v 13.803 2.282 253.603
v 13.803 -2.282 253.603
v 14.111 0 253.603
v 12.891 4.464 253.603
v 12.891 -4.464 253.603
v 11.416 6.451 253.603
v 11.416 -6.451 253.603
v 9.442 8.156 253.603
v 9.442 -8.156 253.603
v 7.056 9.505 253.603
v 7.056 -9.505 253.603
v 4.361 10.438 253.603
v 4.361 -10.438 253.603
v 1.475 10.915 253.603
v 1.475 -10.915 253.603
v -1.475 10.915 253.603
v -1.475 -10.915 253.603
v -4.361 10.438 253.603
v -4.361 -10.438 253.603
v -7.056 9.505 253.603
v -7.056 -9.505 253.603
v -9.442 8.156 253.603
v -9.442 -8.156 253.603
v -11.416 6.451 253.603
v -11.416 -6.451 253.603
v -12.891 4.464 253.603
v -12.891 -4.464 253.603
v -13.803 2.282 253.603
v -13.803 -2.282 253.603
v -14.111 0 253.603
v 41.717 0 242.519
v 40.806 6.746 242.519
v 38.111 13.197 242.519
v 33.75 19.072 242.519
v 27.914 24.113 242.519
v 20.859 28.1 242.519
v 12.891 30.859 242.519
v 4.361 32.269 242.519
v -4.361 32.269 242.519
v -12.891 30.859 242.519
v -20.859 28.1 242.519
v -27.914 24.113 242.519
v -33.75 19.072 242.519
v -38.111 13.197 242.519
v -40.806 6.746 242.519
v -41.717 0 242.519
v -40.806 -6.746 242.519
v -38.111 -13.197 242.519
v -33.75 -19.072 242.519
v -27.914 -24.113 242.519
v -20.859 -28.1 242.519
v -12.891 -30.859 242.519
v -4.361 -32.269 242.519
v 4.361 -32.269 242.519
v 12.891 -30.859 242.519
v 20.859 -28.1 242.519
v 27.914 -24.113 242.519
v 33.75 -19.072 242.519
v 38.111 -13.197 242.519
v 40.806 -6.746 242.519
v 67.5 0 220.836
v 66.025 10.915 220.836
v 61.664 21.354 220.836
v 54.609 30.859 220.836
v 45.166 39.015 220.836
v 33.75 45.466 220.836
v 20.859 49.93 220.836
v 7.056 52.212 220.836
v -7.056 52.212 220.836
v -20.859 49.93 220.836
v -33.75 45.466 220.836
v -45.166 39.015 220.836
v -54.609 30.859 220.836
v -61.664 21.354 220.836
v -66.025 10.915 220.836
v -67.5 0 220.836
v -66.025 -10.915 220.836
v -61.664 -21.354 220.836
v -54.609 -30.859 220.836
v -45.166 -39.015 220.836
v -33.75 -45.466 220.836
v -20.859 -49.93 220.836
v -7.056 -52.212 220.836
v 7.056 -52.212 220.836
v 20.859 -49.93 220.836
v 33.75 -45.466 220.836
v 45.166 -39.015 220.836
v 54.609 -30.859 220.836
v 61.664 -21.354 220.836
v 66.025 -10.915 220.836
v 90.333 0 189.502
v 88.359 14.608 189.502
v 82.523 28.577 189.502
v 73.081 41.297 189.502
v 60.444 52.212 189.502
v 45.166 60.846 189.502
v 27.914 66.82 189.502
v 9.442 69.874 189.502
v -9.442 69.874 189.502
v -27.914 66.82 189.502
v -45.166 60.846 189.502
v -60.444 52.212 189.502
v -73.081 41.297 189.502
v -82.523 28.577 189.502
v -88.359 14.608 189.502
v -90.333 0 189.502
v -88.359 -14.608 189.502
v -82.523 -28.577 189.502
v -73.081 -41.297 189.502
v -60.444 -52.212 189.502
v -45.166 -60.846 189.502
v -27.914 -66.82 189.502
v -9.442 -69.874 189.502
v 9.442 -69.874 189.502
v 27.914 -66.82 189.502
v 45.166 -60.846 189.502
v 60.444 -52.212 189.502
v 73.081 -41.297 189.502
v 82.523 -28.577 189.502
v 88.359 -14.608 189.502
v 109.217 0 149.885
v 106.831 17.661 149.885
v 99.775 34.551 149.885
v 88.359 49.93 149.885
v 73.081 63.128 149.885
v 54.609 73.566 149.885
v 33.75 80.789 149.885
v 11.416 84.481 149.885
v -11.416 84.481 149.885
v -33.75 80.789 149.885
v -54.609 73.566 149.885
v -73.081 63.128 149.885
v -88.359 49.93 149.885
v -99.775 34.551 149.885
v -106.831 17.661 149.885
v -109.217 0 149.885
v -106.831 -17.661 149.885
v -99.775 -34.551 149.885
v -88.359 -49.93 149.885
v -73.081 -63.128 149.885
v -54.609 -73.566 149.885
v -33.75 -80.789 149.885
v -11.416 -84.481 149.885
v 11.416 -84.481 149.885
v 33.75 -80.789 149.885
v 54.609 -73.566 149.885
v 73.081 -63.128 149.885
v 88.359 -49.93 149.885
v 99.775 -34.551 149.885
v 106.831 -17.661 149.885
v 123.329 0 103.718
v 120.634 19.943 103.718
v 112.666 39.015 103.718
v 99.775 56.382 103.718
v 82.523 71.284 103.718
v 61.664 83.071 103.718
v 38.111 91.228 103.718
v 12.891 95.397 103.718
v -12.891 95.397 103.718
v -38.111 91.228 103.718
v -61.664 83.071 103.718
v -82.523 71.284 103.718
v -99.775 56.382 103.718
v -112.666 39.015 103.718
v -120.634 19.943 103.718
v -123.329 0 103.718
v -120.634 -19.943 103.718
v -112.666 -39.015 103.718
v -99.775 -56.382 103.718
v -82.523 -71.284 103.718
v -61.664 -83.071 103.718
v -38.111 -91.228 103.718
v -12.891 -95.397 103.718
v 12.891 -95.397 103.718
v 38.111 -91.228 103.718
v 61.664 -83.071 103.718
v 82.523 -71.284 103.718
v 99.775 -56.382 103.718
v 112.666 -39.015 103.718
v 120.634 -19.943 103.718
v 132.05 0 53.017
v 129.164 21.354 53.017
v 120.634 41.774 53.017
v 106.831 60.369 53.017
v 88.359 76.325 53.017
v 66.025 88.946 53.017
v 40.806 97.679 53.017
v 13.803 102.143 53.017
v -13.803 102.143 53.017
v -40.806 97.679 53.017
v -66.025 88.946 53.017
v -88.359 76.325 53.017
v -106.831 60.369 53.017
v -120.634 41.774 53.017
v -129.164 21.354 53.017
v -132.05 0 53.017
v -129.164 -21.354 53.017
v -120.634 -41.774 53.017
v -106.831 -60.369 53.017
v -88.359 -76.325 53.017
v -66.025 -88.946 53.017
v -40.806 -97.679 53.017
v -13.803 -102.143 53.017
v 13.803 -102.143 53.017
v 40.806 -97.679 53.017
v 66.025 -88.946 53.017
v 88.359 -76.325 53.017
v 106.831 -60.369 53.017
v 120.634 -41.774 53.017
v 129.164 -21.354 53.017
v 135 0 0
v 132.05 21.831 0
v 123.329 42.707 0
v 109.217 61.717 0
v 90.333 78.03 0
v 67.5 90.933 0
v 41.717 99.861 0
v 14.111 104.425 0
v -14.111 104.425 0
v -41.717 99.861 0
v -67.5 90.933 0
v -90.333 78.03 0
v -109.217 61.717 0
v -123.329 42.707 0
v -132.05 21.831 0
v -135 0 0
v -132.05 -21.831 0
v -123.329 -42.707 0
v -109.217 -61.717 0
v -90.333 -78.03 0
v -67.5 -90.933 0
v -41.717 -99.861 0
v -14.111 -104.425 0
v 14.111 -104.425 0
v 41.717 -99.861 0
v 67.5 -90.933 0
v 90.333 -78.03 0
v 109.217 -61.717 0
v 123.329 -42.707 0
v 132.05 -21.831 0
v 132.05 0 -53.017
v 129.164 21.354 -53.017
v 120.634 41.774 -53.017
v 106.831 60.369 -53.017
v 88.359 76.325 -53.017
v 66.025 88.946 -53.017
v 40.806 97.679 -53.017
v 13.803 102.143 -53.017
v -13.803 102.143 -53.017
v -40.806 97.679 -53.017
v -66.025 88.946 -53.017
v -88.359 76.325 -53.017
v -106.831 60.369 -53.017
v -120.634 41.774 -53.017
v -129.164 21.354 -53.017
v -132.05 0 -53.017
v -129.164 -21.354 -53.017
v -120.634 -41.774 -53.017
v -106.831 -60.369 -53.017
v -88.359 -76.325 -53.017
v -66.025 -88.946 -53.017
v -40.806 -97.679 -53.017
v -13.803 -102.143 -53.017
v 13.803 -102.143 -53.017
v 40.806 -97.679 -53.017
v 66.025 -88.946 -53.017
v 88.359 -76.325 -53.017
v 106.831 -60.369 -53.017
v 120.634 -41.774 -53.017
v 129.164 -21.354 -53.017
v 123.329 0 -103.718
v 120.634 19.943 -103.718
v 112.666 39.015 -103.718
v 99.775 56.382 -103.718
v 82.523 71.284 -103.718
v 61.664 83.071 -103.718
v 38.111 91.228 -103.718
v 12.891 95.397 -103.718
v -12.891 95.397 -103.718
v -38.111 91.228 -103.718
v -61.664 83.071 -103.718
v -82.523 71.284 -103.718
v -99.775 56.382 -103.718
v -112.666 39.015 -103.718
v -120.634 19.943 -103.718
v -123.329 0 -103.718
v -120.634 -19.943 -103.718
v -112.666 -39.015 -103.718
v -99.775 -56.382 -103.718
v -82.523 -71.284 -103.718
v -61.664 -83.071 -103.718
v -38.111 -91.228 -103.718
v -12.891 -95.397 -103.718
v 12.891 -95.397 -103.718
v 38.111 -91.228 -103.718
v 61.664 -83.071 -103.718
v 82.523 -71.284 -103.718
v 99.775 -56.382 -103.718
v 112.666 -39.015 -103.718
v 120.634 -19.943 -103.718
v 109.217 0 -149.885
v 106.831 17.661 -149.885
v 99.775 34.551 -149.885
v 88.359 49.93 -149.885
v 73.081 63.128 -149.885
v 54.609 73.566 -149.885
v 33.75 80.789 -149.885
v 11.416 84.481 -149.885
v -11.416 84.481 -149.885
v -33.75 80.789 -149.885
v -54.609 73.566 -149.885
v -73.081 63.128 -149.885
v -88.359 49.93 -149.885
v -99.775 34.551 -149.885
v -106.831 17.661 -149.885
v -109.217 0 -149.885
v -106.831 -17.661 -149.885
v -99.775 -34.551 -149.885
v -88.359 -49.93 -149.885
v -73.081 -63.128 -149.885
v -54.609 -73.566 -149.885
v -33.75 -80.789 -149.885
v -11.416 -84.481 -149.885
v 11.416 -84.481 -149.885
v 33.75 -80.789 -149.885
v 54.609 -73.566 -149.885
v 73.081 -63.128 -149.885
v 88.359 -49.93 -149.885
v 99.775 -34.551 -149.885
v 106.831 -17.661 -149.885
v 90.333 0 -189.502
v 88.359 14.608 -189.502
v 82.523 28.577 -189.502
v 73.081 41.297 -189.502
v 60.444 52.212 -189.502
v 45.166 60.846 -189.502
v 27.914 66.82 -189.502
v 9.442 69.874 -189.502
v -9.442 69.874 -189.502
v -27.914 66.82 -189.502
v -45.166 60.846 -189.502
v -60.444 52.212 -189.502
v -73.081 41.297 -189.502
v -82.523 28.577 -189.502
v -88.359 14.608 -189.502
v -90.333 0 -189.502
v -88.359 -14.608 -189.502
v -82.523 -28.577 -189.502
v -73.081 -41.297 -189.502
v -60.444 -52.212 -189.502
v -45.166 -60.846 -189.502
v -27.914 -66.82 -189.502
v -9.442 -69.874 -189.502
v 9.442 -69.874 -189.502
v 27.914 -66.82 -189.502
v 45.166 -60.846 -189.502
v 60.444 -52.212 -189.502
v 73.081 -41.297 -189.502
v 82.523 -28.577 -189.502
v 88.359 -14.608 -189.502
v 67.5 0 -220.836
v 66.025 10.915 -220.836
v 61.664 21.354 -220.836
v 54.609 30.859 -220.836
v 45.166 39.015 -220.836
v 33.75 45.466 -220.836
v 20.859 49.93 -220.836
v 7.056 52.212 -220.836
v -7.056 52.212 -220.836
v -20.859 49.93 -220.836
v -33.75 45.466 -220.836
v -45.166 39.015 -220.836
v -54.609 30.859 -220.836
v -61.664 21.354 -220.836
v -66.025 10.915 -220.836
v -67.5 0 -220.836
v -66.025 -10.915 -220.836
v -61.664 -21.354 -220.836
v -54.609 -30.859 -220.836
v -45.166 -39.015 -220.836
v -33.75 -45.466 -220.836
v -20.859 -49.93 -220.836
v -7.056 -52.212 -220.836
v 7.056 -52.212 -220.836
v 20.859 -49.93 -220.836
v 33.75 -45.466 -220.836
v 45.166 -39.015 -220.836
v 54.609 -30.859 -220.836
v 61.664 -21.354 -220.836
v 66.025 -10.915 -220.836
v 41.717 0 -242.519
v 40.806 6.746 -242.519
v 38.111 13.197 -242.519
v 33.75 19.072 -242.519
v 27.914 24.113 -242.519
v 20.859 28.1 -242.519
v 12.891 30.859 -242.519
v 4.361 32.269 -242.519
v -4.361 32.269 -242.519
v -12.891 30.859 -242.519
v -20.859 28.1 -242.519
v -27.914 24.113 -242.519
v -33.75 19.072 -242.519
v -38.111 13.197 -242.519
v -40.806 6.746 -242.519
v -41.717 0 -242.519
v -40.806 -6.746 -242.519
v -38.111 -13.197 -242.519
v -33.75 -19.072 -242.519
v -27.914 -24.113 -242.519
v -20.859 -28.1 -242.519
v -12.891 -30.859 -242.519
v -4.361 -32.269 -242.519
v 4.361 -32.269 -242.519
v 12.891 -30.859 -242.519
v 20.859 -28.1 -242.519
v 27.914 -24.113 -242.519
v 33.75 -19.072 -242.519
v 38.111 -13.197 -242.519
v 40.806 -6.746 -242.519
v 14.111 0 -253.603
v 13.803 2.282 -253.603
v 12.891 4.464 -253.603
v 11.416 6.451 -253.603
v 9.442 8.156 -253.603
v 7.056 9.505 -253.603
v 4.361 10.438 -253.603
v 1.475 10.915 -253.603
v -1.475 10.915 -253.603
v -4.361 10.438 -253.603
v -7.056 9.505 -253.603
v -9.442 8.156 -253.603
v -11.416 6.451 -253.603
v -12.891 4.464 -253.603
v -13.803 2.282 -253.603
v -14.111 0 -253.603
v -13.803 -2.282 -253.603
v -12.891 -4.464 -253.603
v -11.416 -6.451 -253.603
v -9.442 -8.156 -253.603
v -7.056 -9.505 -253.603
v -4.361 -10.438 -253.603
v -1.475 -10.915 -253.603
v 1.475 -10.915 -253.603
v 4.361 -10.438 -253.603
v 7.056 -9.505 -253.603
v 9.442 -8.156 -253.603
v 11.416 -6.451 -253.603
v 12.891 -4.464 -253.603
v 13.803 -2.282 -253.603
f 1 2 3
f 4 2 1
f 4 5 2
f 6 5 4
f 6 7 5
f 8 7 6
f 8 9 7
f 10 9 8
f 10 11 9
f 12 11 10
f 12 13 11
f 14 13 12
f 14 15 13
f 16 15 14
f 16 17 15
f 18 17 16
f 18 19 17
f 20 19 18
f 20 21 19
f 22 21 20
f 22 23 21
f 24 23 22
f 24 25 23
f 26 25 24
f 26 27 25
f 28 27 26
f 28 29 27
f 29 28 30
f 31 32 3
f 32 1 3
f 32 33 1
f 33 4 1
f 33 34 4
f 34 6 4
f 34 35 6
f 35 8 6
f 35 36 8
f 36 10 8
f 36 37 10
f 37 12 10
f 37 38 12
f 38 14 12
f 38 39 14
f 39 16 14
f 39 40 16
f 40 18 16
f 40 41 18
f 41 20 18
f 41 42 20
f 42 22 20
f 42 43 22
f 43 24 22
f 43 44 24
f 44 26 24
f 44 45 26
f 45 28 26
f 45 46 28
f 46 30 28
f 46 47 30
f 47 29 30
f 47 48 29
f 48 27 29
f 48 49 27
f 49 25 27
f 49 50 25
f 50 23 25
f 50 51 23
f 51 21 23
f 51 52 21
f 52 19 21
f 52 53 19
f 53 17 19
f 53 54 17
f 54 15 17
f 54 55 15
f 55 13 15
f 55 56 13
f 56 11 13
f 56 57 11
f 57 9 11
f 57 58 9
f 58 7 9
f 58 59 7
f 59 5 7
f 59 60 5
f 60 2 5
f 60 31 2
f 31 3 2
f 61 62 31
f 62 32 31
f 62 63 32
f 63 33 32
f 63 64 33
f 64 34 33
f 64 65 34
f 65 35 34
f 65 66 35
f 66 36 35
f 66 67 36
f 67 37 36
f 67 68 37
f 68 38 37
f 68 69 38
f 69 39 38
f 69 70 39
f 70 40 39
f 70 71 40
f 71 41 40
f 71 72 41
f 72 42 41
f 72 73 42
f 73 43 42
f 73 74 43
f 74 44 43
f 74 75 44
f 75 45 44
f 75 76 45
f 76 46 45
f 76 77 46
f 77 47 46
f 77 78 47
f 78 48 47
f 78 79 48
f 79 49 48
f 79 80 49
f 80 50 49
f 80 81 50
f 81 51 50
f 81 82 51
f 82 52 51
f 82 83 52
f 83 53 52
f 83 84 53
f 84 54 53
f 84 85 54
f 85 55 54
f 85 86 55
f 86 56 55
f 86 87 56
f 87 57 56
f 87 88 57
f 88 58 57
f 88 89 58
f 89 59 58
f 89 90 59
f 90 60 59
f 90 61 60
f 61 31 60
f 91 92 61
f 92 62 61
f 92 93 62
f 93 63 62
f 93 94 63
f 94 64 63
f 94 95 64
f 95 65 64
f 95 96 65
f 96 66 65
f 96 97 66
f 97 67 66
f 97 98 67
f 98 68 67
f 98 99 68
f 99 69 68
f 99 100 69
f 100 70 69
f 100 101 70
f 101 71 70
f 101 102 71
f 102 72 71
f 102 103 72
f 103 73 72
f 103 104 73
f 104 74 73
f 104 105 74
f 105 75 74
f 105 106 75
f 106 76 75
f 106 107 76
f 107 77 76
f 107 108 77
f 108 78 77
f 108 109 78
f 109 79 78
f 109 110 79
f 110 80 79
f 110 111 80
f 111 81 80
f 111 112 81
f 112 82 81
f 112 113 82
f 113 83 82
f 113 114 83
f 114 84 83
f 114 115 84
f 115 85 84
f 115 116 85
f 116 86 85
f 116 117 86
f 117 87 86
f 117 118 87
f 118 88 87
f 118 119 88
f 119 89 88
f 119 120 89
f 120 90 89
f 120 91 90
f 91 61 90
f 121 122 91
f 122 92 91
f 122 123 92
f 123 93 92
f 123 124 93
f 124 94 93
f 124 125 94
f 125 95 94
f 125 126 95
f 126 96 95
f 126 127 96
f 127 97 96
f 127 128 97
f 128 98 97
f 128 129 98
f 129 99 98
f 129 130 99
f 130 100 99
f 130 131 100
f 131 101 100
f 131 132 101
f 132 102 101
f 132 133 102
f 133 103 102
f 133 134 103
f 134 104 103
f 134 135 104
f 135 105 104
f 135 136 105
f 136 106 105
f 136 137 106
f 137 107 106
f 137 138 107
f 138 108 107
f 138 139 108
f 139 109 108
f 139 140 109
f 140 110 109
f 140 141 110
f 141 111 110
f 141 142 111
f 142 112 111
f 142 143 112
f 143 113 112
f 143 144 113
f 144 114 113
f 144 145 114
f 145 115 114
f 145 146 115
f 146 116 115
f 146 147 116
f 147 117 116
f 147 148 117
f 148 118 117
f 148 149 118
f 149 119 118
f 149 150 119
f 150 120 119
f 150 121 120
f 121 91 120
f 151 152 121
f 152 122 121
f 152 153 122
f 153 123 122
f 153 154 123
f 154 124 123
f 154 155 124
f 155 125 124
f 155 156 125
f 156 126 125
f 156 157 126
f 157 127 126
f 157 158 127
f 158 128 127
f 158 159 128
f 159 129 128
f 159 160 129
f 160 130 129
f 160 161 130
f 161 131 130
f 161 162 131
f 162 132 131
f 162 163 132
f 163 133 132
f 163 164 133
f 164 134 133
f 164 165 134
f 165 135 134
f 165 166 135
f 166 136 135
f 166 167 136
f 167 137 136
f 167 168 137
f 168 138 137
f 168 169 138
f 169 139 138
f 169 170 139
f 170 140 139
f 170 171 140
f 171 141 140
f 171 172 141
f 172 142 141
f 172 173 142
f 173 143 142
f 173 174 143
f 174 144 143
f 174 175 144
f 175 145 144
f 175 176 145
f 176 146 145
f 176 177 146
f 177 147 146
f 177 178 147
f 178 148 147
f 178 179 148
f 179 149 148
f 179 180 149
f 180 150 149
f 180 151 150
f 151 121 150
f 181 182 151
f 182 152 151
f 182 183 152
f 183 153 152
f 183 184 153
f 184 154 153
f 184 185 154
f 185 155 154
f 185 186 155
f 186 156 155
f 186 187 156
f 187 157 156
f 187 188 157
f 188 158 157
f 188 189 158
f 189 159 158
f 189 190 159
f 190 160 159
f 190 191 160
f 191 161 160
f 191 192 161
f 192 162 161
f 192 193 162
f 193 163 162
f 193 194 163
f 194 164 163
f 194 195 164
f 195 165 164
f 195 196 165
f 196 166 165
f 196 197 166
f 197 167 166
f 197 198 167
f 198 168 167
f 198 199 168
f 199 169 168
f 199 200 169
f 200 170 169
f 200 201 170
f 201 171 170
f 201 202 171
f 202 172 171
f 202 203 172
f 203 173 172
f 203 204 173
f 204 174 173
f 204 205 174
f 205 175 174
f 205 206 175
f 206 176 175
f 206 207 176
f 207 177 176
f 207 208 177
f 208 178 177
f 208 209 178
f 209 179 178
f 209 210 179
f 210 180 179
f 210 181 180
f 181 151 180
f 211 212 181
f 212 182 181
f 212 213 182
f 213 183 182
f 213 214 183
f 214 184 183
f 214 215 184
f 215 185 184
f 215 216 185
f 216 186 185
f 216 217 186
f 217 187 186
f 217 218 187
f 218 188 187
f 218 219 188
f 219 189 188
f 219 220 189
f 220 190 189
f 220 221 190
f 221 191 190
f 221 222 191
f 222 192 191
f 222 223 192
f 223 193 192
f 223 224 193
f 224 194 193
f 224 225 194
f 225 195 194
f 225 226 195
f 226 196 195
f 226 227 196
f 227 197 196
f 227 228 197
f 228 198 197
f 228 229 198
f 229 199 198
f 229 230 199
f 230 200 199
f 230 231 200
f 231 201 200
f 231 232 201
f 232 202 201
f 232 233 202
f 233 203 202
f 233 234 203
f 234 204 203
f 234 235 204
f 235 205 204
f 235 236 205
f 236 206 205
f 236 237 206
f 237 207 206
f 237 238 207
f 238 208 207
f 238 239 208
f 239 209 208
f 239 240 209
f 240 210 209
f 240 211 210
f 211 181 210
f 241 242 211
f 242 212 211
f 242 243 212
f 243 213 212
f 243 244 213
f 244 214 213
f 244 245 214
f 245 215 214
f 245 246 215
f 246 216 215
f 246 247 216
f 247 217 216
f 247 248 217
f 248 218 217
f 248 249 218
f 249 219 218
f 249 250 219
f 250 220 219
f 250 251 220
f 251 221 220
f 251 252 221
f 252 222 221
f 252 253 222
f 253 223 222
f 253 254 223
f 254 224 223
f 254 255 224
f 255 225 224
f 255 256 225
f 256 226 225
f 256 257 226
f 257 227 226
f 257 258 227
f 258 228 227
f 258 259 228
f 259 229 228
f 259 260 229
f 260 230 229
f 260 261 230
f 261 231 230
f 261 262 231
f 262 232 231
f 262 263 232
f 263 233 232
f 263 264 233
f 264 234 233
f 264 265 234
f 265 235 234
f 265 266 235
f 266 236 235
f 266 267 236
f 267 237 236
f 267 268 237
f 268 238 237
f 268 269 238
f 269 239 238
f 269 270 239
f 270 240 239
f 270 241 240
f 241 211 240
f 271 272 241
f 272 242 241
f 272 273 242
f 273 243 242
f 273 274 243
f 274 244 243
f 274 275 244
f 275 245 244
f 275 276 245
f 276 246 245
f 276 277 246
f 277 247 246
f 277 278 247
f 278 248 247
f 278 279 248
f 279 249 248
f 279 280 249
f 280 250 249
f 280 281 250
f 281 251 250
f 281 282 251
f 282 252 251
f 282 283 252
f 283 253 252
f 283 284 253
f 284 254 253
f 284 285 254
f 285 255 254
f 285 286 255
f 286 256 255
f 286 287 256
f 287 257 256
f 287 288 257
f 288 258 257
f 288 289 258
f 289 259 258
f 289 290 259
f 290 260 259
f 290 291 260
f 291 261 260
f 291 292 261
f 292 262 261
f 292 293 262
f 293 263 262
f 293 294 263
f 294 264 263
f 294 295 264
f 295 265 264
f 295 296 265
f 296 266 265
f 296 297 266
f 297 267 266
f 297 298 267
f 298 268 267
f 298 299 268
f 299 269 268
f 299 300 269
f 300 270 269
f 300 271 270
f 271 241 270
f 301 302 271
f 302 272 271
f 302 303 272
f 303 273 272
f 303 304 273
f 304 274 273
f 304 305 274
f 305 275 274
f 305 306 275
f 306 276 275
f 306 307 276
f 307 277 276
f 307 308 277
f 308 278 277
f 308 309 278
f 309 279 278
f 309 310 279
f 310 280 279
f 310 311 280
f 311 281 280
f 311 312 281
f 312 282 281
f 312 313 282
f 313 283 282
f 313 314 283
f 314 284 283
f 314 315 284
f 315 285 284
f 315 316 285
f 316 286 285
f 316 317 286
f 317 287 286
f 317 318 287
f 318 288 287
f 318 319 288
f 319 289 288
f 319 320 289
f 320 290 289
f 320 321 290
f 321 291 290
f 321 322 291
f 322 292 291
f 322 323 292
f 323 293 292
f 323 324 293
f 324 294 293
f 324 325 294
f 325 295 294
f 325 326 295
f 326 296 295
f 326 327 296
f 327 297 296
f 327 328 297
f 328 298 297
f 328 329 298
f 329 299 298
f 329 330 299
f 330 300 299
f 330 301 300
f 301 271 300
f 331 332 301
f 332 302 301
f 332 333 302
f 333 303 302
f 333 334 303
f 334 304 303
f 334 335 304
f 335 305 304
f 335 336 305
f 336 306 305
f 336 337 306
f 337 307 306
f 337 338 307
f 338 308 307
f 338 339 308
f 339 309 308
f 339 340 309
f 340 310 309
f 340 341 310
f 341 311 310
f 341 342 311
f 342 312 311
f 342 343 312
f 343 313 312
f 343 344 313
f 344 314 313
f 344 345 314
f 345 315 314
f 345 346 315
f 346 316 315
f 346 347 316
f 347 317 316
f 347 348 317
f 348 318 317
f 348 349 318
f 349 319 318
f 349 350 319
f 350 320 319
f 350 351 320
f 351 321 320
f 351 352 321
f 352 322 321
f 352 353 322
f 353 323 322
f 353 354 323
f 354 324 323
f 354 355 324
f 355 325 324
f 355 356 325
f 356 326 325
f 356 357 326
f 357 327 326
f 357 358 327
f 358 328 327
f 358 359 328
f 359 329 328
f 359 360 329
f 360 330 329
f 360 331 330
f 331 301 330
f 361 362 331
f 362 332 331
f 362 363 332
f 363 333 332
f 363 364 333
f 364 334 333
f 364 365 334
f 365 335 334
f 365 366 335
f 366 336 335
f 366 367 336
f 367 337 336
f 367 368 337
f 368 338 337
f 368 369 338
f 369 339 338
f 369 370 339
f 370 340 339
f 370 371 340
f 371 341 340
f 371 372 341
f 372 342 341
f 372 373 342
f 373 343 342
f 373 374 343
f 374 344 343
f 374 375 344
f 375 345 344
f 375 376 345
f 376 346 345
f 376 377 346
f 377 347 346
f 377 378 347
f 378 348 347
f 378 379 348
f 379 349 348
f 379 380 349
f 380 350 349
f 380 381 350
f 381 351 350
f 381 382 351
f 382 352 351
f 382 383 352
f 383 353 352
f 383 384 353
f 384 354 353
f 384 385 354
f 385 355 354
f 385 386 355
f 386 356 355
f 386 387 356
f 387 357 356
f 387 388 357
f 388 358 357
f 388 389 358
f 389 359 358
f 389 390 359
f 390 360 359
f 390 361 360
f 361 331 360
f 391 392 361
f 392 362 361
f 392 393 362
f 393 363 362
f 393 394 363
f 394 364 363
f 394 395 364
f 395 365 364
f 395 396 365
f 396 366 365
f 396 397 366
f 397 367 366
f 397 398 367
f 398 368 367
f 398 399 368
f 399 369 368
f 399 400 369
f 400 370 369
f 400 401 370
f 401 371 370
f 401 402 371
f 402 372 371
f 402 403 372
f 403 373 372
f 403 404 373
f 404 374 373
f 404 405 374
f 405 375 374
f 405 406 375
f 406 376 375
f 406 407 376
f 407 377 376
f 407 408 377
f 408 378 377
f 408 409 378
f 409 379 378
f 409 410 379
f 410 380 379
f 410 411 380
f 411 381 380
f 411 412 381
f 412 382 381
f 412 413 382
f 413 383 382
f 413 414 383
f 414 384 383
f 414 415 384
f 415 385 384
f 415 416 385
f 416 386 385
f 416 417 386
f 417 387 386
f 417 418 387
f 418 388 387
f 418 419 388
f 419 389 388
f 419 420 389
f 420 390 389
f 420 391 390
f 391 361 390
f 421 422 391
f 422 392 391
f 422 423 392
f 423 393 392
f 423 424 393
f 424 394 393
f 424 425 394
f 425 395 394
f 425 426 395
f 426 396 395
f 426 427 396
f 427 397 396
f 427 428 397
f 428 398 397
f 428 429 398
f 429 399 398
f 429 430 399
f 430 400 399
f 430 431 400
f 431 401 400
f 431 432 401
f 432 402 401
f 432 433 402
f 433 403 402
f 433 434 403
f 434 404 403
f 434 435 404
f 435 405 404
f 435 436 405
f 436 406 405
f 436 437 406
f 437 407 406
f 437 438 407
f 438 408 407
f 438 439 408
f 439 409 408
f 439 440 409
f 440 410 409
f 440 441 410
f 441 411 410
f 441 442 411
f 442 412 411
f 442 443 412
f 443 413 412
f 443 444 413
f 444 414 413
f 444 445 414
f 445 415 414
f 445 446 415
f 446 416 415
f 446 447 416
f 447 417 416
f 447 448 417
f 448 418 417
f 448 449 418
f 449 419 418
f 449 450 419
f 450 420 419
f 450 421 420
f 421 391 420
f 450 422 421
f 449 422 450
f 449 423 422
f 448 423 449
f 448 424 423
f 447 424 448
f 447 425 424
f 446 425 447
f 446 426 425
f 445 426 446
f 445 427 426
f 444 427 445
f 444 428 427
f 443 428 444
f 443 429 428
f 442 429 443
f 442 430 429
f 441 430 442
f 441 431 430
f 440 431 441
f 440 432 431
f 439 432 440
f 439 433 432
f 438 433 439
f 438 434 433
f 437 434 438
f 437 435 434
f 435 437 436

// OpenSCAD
// Generated by SolidPython 1.0.1 on 2020-07-29 00:46:48


scale(v = [9, 7, 17]) {
	sphere(r = 15);
}
/***********************************************
*********      SolidPython code:      **********
************************************************
 
# import packages: SolidPython
from solid import *
from solid.utils import *
from itertools import chain, combinations, permutations


class Resize:

    def __init__(self, scad_file):
        self.scad_file = scad_file
        #self.scad_file = import_scad(scad_file)
        # cone/cylinder param:
        self.r1 = 0
        self.r2 = 0
        self.h = 0
        # rectangular prism param:
        self.w = 0
        self.l = 0
        # ellipse param:
        self.r = 0

    # import OpenScad code (file name corresponds to shape)


    # classify shape + parameters
    def assign(self, param1, param2, param3):
        if self.scad_file == 'cone.scad':
            self.r1 = param1
            self.r2 = param2
            self.h = param3
        elif self.scad_file == 'cylinder.scad':
            self.r1 = param1
            self.r2 = param2
            self.h = param3
        elif self.scad_file == 'rectangularPrism.scad':
            self.h = param1
            self.l = param2
            self.w = param3
        else:
            self.r = param1
            self.h = param2

    # resize parameters
    def iterate(self):
        x = range(3, 20, 2)
        i = 1
        if self.scad_file == 'cone.scad':
            tempList = list(permutations(x, 2))
            for temp in tempList:
                param1 = temp[0]
                param2 = temp[1]
                filepath = 'produced_scad_files/' + 'cone' + str(param1) + '_' + str(param2) + '_' + '.scad'
                scad_render_to_file(cylinder(h=param1, r1=param2, r2=0), filepath)

        elif self.scad_file == 'cylinder.scad':
            tempList = list(permutations(x, 3))
            for temp in tempList:
                param1 = temp[0]
                param2 = temp[1]
                filepath = 'produced_scad_files/' + 'cylinder' + str(param1) + '_' + str(param2) + '_' + '.scad'
                scad_render_to_file(cylinder(h=param1, r1=param2, r2=param2), filepath)

        elif self.scad_file == 'rectangularPrism.scad':
            tempList = list(permutations(x, 3))
            for temp in tempList:
                param1 = temp[0]
                param2 = temp[1]
                param3 = temp[2]
                filepath = 'produced_scad_files/' + 'rectangularPrism' + str(param1) + '_' + str(param2) + '_' + str(
                    param3) + '.scad'
                scad_render_to_file(cube(size=(param1, param2, param3)), filepath)

        elif self.scad_file == 'ellipse.scad':
            tempList = list(permutations(x, 4))
            for temp in tempList:
                param1 = temp[0]
                param2 = temp[1]
                param3 = temp[2]
                param4 = temp[3]
                filepath = 'produced_scad_files/' + 'ellipse' + str(param1) + '_' + str(param2) + '_' + str(param3) + '_' + str(param4) + '.scad'
                scad_render_to_file(scale([param1, param2, param3])(sphere(r=param4)), filepath)

    def render_to_scadfile(self):
        scad_render_to_file(scad, 'example.scad') 
 
************************************************/
